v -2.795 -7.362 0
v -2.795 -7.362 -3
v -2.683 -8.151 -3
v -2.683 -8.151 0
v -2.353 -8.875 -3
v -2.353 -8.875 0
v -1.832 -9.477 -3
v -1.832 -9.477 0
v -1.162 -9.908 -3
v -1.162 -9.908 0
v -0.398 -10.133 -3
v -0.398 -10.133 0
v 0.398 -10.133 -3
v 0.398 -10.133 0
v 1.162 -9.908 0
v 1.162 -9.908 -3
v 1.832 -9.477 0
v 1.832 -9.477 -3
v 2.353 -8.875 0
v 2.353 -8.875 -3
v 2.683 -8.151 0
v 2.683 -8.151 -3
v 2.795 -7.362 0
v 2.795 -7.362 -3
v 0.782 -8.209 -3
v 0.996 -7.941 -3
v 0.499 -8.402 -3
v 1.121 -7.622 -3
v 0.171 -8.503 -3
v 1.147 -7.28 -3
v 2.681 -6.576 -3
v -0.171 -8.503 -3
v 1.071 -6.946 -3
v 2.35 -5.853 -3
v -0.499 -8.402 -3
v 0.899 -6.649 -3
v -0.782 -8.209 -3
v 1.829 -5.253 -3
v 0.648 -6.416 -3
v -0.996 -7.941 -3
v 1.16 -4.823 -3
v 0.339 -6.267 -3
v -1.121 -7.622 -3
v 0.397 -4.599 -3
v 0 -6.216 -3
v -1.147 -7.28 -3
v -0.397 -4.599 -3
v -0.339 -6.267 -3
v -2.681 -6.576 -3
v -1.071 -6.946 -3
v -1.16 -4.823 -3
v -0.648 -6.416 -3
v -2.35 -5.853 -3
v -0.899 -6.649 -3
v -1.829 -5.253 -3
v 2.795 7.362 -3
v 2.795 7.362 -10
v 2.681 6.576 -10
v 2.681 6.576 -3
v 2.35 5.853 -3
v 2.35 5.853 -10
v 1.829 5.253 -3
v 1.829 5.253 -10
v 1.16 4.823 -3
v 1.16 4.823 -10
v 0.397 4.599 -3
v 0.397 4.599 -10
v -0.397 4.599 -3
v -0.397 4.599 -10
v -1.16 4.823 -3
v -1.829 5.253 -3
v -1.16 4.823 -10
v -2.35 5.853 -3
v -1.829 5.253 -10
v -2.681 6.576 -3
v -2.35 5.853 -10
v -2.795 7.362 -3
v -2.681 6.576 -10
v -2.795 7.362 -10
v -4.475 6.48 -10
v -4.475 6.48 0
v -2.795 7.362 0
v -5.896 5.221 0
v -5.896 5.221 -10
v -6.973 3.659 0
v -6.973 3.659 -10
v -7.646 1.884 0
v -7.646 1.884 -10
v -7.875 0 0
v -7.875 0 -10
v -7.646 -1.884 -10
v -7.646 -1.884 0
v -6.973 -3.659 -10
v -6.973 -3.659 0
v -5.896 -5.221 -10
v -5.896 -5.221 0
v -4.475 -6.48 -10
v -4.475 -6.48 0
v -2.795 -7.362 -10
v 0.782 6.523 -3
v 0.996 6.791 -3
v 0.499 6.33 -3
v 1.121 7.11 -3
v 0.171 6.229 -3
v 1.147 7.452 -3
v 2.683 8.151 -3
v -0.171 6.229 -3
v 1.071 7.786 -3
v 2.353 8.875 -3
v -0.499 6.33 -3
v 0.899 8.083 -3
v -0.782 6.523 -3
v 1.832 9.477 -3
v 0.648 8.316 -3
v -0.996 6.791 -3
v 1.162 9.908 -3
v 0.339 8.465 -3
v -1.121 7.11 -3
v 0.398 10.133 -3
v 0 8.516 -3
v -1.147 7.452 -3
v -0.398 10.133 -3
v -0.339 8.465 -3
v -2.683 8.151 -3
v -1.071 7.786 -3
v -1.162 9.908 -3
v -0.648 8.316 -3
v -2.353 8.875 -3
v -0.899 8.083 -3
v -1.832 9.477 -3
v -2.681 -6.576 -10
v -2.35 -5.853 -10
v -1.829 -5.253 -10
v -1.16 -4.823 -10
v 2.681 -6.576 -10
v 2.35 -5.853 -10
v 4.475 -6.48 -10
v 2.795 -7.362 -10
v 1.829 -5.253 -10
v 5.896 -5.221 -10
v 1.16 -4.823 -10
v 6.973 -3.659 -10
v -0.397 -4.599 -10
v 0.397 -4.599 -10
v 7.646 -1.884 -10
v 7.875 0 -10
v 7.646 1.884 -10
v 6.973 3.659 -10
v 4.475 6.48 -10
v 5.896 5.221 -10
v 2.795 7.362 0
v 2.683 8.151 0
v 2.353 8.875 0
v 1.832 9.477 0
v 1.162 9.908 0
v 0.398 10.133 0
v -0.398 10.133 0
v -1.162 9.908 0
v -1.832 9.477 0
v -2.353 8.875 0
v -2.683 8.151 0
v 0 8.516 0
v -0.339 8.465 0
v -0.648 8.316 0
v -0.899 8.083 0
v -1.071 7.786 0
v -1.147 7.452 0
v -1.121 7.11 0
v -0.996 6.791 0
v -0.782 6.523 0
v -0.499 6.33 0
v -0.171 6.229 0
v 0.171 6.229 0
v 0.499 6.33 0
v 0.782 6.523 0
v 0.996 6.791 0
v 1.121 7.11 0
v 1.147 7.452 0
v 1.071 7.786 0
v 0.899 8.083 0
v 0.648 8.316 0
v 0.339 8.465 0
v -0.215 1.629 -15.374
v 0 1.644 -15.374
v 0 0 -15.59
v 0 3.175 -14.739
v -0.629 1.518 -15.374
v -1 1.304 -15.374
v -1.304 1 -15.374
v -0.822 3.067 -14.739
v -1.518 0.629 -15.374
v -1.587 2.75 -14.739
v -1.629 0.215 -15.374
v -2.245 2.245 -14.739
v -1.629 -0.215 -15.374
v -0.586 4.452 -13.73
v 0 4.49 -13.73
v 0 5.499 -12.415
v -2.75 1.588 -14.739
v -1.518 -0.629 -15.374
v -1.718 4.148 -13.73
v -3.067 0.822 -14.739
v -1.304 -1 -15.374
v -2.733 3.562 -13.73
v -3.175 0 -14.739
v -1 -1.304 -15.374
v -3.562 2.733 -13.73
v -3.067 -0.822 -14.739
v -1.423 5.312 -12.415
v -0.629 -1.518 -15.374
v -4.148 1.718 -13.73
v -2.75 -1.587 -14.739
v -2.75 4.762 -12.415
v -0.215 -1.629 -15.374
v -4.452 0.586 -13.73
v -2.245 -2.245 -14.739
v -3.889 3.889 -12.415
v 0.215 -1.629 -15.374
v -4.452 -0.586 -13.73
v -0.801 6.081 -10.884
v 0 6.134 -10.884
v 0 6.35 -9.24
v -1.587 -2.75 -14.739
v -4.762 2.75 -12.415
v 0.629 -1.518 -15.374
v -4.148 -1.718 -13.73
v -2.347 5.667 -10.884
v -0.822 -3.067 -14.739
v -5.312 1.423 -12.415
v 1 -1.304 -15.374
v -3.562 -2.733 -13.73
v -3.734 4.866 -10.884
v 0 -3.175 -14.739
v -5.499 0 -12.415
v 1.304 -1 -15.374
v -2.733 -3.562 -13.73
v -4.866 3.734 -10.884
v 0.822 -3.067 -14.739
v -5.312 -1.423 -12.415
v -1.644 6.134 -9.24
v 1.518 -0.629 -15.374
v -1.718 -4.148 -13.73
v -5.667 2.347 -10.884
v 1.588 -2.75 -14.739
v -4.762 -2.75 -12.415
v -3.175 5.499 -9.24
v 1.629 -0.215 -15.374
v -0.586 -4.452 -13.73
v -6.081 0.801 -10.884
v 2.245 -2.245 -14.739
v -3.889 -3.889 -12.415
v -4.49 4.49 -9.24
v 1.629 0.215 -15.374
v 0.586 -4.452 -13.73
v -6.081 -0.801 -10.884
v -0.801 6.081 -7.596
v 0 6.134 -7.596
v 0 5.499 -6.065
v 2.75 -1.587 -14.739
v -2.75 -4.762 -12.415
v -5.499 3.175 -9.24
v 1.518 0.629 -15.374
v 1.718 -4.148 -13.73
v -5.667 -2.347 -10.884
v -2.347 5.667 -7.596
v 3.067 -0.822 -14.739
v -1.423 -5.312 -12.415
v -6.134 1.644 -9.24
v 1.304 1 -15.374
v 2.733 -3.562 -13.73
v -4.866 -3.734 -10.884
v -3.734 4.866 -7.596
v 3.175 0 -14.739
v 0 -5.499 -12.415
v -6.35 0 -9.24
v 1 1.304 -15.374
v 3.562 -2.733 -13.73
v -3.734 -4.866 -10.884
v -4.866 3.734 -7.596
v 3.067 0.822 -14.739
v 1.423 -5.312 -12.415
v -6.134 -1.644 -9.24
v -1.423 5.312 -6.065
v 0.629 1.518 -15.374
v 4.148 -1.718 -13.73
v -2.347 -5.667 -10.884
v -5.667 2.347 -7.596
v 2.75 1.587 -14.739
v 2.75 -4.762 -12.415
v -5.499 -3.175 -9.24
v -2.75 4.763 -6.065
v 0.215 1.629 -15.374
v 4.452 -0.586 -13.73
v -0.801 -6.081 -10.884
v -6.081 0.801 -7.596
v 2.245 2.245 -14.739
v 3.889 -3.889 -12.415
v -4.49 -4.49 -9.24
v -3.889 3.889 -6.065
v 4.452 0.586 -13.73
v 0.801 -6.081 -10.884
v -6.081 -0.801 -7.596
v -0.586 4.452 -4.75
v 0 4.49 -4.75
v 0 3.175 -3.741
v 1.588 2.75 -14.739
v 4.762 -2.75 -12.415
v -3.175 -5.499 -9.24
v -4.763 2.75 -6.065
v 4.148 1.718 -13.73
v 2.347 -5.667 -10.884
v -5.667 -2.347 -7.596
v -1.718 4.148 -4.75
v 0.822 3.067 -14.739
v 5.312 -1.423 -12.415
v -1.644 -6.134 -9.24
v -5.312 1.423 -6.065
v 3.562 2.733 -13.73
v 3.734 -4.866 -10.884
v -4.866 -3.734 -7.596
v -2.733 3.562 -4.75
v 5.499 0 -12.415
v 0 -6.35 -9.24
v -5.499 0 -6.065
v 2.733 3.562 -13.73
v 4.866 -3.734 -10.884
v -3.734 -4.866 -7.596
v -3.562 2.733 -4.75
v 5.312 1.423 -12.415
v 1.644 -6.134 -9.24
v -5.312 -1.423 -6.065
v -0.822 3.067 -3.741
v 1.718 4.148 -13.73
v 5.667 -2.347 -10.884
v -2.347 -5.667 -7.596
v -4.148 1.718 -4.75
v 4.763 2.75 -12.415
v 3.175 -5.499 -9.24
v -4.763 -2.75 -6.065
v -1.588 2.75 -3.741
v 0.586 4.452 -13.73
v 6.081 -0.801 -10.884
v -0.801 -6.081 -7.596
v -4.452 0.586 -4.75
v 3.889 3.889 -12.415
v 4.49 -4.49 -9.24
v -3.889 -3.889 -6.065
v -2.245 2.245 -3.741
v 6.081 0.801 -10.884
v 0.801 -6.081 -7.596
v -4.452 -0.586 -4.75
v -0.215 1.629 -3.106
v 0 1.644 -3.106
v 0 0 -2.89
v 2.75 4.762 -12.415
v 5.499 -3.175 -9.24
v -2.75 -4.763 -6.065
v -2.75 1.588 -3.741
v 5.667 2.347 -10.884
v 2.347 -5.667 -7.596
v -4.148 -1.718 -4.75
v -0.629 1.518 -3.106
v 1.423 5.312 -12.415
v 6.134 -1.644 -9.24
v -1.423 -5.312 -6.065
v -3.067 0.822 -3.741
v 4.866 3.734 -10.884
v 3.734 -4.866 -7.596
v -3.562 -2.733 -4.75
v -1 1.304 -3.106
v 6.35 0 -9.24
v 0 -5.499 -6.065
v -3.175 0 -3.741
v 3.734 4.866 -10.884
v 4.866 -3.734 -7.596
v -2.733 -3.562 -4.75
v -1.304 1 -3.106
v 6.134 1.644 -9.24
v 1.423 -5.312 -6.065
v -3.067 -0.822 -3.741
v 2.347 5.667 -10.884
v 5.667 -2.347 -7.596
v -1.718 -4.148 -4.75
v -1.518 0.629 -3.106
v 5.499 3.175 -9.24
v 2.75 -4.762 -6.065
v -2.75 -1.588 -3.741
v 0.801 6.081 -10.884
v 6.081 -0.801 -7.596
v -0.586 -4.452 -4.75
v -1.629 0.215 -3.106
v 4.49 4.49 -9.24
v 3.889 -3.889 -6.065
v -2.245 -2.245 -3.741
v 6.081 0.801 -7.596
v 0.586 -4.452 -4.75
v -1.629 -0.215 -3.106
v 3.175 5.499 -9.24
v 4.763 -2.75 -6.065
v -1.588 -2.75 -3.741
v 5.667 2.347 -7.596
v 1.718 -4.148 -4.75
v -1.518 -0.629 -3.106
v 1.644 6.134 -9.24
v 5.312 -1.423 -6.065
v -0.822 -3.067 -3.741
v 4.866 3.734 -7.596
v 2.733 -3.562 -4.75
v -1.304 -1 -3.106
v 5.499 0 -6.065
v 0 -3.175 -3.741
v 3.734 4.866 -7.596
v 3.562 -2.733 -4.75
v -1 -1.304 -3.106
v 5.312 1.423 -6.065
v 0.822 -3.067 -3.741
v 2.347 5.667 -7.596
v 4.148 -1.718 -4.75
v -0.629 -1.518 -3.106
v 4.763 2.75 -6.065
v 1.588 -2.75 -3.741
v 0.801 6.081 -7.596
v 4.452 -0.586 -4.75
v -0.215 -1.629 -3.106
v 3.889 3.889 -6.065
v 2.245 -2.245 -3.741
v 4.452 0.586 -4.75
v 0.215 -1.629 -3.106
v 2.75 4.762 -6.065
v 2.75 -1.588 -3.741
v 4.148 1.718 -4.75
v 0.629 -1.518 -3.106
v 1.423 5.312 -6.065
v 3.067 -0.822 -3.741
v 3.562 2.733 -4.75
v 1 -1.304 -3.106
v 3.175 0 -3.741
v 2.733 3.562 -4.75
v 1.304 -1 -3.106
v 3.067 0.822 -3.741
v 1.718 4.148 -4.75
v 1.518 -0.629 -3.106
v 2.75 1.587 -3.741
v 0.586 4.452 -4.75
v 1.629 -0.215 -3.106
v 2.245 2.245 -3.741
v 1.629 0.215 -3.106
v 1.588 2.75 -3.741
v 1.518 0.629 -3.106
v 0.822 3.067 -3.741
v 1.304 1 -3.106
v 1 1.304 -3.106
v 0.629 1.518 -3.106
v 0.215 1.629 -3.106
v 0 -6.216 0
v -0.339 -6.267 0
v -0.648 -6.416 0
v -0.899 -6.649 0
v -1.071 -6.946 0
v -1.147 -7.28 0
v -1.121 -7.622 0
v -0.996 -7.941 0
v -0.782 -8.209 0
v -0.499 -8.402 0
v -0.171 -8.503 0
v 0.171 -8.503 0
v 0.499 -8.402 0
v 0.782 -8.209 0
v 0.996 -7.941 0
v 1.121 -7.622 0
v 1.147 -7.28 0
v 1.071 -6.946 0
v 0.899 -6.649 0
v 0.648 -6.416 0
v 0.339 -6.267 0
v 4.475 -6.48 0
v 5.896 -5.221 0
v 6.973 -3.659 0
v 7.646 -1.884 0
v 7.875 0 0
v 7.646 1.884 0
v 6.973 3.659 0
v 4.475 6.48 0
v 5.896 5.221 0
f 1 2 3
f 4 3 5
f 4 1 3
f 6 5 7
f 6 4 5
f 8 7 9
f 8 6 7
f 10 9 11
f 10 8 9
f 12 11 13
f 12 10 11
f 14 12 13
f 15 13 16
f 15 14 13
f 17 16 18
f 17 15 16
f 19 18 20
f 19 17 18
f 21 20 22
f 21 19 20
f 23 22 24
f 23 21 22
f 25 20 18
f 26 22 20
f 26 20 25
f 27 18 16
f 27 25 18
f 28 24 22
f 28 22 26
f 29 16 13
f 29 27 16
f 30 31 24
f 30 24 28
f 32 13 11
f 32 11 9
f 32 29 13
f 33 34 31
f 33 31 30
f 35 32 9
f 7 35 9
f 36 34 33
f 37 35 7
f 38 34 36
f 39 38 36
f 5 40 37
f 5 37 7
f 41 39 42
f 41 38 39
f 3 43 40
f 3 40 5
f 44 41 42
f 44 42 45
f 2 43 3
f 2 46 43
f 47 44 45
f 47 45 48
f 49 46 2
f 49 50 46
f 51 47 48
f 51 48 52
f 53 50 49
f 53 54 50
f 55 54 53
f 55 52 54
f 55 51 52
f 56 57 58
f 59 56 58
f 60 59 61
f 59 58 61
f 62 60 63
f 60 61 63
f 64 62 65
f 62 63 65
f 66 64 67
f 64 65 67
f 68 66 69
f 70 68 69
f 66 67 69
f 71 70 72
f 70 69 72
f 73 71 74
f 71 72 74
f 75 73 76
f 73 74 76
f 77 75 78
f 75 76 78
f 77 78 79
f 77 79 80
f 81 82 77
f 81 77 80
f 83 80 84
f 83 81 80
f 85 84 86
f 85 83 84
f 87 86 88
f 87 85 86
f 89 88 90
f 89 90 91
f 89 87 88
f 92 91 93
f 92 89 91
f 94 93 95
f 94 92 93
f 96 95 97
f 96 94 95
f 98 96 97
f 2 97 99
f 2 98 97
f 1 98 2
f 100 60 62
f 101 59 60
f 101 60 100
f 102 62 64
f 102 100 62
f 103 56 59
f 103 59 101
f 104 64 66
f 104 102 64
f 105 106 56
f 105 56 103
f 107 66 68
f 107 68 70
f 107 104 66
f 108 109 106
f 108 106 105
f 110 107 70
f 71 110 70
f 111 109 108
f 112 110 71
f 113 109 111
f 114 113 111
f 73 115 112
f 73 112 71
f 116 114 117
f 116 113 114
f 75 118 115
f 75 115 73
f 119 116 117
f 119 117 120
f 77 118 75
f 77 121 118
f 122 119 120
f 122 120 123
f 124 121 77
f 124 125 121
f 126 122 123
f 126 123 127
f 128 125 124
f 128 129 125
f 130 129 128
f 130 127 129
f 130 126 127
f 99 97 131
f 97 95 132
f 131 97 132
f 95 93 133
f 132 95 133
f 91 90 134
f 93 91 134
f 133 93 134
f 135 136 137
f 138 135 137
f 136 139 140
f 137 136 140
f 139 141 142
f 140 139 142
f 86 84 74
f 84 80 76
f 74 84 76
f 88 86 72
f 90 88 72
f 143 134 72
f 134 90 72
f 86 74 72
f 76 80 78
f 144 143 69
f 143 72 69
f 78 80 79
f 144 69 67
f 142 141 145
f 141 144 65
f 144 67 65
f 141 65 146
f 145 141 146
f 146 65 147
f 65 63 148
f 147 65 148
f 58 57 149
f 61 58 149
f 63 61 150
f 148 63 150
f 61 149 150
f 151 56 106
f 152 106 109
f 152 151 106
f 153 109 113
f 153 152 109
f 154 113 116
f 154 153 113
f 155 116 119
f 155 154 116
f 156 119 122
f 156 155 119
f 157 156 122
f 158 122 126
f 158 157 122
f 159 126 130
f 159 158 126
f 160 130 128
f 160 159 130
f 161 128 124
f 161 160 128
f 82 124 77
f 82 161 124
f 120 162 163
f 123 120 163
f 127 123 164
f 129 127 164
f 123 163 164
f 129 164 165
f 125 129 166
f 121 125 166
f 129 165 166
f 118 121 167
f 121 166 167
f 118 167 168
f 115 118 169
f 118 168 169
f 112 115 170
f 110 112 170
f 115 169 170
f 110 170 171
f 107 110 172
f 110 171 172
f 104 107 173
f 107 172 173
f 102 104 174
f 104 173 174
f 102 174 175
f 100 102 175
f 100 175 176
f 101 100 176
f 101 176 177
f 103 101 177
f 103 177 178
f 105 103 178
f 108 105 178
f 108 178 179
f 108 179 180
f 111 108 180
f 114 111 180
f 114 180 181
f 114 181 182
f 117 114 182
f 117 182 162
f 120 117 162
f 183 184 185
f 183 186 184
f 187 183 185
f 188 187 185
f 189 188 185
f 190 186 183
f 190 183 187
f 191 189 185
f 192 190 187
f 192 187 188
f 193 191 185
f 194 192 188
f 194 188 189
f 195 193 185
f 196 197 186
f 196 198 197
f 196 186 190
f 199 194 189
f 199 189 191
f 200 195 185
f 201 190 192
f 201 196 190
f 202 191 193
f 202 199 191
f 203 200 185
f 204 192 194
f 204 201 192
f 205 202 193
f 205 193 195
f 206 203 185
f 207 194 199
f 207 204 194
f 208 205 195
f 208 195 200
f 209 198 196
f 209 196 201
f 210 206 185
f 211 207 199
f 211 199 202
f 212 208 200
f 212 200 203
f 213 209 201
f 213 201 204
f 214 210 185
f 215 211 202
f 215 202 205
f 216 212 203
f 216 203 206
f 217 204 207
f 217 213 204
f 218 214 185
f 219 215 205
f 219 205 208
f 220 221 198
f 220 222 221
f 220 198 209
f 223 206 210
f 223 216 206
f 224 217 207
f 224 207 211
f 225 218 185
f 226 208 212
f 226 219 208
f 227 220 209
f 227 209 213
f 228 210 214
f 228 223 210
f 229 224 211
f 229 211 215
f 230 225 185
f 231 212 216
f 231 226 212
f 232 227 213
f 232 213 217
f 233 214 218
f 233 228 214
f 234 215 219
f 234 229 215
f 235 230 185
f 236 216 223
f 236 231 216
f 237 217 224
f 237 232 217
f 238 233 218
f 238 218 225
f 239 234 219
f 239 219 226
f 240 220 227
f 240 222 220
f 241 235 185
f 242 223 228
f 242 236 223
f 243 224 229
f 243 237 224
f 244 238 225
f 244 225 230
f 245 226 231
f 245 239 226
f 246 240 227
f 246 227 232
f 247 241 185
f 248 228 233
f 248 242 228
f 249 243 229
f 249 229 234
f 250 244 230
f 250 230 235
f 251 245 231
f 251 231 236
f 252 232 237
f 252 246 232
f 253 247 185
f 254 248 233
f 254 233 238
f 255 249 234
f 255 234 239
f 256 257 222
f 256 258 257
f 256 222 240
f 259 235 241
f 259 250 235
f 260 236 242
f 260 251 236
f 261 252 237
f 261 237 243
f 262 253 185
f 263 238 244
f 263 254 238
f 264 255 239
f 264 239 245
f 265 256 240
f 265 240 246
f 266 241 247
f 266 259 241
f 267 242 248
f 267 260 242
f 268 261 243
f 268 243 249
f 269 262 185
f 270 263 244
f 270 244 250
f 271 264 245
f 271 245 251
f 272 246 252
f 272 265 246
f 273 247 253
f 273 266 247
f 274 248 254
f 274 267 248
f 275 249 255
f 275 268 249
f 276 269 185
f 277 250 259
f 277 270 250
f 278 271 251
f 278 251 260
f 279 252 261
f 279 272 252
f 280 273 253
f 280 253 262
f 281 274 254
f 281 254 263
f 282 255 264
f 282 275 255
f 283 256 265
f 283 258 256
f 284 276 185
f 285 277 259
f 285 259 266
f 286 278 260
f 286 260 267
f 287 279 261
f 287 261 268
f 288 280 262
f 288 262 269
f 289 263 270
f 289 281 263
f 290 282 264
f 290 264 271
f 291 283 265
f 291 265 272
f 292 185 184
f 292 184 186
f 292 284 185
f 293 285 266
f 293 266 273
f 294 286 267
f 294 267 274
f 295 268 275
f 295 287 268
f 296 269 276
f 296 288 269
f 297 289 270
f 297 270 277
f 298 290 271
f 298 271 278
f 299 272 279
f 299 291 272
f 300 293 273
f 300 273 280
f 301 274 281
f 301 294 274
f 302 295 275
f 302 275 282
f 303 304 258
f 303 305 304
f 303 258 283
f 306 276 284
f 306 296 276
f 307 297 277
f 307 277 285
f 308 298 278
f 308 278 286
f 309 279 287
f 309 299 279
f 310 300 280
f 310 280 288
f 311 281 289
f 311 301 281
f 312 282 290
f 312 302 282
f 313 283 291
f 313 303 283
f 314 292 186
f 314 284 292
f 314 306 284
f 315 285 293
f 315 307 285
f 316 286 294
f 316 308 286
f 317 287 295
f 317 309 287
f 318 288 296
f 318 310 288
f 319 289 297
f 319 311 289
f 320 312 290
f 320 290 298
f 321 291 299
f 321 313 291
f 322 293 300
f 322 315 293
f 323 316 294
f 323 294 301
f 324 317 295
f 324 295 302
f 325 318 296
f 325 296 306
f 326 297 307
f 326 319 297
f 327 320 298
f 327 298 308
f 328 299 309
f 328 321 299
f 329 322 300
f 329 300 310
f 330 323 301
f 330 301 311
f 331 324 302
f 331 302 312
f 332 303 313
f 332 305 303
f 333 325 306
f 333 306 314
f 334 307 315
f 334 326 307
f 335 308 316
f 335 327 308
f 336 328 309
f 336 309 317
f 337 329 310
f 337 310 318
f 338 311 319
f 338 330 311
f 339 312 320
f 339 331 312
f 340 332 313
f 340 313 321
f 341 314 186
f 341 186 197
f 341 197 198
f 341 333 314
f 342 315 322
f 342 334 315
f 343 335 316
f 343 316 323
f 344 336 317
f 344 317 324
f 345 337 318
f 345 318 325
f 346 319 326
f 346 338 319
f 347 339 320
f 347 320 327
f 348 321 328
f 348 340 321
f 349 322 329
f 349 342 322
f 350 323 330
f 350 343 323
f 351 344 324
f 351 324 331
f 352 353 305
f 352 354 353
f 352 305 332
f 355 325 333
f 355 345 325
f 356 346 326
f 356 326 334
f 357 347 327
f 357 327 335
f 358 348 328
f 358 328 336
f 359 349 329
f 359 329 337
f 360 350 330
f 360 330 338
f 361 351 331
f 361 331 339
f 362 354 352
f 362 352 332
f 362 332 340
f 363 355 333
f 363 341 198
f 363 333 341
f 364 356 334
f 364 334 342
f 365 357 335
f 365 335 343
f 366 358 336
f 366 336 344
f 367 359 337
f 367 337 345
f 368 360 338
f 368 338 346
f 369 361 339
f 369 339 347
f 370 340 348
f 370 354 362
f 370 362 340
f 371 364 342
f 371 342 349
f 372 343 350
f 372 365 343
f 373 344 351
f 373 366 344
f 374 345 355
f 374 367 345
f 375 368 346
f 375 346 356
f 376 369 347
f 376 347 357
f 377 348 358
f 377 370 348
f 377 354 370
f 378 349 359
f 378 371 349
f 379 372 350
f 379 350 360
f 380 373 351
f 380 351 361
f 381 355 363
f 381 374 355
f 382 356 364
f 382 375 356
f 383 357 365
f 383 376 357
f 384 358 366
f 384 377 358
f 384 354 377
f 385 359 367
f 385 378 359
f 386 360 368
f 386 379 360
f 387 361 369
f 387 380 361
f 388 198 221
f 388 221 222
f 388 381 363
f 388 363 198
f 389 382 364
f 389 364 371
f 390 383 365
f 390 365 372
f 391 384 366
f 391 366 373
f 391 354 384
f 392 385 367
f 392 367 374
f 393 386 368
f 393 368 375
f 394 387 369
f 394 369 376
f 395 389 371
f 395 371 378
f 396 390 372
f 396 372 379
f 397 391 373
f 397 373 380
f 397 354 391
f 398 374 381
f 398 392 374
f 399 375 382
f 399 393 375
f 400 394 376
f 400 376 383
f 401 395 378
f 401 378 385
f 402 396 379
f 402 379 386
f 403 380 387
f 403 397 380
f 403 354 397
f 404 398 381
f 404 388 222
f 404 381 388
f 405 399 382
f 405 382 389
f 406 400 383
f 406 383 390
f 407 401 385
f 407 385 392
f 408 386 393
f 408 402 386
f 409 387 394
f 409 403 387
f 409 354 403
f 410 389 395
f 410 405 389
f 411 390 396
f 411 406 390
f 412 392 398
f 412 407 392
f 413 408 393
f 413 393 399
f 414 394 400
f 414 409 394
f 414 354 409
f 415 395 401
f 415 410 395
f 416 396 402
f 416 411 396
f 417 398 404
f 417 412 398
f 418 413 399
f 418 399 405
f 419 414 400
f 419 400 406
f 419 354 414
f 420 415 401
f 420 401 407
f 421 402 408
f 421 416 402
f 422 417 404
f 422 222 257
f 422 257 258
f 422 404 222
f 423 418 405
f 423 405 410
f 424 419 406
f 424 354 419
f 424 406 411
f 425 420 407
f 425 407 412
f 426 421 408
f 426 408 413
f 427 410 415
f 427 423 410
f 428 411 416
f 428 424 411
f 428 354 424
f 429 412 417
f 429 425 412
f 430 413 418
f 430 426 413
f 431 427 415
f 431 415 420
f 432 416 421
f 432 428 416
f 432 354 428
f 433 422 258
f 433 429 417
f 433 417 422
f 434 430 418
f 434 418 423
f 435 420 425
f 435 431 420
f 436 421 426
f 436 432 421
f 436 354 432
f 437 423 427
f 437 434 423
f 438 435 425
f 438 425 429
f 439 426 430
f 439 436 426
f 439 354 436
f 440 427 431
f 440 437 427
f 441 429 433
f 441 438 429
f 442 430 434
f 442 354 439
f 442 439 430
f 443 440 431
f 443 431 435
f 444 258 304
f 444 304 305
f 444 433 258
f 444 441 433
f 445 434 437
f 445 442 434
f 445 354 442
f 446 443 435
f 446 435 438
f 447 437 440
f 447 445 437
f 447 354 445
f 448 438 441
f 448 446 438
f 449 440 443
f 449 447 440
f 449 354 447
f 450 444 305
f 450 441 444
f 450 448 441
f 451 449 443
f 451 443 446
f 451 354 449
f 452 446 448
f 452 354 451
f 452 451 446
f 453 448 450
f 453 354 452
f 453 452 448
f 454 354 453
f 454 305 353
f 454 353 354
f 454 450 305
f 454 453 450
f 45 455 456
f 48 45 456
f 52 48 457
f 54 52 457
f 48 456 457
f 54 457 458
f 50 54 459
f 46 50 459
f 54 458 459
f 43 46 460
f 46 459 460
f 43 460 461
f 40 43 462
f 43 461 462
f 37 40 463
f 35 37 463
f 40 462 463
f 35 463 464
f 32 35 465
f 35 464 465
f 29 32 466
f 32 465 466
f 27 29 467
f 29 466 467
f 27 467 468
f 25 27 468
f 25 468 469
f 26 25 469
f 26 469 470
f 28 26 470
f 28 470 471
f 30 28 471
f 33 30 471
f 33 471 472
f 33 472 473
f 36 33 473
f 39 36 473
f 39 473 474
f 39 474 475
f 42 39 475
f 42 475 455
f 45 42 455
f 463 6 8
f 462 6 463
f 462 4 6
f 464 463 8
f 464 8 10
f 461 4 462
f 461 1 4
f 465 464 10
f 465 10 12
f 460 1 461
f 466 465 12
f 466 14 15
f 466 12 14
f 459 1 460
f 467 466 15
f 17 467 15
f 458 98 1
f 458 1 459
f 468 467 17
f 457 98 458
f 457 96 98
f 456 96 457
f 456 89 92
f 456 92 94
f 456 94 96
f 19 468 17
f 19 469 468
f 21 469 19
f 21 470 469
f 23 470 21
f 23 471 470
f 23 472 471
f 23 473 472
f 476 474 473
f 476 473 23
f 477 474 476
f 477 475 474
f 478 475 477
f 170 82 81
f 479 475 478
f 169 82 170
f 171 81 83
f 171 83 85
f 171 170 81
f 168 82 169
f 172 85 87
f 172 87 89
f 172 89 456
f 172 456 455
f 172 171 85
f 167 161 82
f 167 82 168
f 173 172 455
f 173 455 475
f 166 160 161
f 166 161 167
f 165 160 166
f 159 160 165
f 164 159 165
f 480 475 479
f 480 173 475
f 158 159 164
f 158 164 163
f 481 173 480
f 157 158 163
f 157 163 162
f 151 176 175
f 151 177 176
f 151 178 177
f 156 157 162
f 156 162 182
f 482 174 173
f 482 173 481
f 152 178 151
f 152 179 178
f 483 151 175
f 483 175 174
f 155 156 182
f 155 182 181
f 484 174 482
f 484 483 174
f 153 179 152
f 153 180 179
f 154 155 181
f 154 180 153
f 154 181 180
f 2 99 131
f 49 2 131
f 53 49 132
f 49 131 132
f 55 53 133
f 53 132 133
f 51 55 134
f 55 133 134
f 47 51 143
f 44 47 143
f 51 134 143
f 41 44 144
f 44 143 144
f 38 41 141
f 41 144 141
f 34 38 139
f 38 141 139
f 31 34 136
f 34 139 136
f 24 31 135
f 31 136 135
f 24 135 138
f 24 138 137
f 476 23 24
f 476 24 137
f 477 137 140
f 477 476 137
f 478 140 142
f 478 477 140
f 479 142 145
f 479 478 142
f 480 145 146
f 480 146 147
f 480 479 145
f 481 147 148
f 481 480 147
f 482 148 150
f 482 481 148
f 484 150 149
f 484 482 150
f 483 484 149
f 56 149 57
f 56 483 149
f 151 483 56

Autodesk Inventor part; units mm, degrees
ref_plane "YZ Plane" through (0, 0, 0) normal (1, 0, 0) x (0, 1, 0)
ref_plane "XZ Plane" through (0, 0, 0) normal (0, 1, 0) x (-1, 0, 0)
ref_plane "XY Plane" through (0, 0, 0) normal (0, 0, 1) x (1, 0, 0)
sketch "Sketch1" plane through (0, 0, 0) normal (0, 0, 1) x (1, 0, 0)
  circle A0 centre (0, 0) radius 7.875
  line L0 (0, 0) -> (8.72, 0)
  circle A1 centre (0, 7.366) radius 2.795
  circle A2 centre (0, -7.366) radius 2.795
  dimension "d0" = 14.732
  dimension "d1" = 15.75
  dimension "d2" = 5.59
extrude "Extrusion1" add sketch "Sketch1" against normal blind 10
sketch "Sketch2" plane through (0, 0, -10) normal (0, 0, -1) x (-1, 0, 0)
  arc A0 (-2.795, -7.3623) -> (2.795, -7.3623) centre (0, -7.366) ccw projected
  arc A1 (2.795, 7.3623) -> (-2.795, 7.3623) centre (0, 7.366) ccw projected
  circle A2 centre (0, -7.366) radius 2.795
  arc A3 (2.795, -7.3623) -> (2.795, 7.3623) centre (0, 0) ccw projected
  circle A4 centre (0, 7.366) radius 2.795
extrude "Extrusion2" cut sketch "Sketch2" against normal blind 7
sketch "Sketch3" plane through (0, 0, -3) normal (0, 0, -1) x (-1, 0, 0)
  arc A0 (2.795, 7.3623) -> (-2.795, 7.3623) centre (0, 7.366) ccw projected
  arc A1 (-2.795, -7.3623) -> (2.795, -7.3623) centre (0, -7.366) ccw projected
  point P0 (0, 0)
hole "Hole1" at (0, 7.366, -3) at (0, -7.366, -3) direction (0, 0, 1) diameter 2.3 depth 8 tip angle 118
sketch "Sketch4" plane through (0, 0, 0) normal (1, 0, 0) x (0, 1, 0)
  line L0 (7.3623, 0) -> (7.3623, -3) projected
  line L1 (7.3623, 0) -> (-7.3623, 0) projected
  line L2 (-7.3623, -3) -> (-7.3623, 0) projected
  line L3 (-7.3623, -10) -> (-7.3623, -3) projected
  line L4 (7.3623, -10) -> (-7.3623, -10) projected
  line L5 (7.3623, -3) -> (7.3623, -10) projected
  circle A0 centre (0, -9.24) radius 6.35
  line L6 (0, -9.24) -> (0, -18.9393)
  line L7 (0, -15.59) -> (0, -2.89)
  point P0 (0, 0)
  dimension "d14" = 12.7
  dimension "d15" = 9.24
revolve "Revolution1" add sketch "Sketch4" angle 360 about axis through (0, 0, -9.24) along (0, 0, -1) separate body picked at (4.0811, -10.4958) picked at (0.471, -5.0597) contours A0 L6 L4 | L4 L6 L7 A0
properties part number "Mini-Q Ball caster" material "ABS Plastic"
